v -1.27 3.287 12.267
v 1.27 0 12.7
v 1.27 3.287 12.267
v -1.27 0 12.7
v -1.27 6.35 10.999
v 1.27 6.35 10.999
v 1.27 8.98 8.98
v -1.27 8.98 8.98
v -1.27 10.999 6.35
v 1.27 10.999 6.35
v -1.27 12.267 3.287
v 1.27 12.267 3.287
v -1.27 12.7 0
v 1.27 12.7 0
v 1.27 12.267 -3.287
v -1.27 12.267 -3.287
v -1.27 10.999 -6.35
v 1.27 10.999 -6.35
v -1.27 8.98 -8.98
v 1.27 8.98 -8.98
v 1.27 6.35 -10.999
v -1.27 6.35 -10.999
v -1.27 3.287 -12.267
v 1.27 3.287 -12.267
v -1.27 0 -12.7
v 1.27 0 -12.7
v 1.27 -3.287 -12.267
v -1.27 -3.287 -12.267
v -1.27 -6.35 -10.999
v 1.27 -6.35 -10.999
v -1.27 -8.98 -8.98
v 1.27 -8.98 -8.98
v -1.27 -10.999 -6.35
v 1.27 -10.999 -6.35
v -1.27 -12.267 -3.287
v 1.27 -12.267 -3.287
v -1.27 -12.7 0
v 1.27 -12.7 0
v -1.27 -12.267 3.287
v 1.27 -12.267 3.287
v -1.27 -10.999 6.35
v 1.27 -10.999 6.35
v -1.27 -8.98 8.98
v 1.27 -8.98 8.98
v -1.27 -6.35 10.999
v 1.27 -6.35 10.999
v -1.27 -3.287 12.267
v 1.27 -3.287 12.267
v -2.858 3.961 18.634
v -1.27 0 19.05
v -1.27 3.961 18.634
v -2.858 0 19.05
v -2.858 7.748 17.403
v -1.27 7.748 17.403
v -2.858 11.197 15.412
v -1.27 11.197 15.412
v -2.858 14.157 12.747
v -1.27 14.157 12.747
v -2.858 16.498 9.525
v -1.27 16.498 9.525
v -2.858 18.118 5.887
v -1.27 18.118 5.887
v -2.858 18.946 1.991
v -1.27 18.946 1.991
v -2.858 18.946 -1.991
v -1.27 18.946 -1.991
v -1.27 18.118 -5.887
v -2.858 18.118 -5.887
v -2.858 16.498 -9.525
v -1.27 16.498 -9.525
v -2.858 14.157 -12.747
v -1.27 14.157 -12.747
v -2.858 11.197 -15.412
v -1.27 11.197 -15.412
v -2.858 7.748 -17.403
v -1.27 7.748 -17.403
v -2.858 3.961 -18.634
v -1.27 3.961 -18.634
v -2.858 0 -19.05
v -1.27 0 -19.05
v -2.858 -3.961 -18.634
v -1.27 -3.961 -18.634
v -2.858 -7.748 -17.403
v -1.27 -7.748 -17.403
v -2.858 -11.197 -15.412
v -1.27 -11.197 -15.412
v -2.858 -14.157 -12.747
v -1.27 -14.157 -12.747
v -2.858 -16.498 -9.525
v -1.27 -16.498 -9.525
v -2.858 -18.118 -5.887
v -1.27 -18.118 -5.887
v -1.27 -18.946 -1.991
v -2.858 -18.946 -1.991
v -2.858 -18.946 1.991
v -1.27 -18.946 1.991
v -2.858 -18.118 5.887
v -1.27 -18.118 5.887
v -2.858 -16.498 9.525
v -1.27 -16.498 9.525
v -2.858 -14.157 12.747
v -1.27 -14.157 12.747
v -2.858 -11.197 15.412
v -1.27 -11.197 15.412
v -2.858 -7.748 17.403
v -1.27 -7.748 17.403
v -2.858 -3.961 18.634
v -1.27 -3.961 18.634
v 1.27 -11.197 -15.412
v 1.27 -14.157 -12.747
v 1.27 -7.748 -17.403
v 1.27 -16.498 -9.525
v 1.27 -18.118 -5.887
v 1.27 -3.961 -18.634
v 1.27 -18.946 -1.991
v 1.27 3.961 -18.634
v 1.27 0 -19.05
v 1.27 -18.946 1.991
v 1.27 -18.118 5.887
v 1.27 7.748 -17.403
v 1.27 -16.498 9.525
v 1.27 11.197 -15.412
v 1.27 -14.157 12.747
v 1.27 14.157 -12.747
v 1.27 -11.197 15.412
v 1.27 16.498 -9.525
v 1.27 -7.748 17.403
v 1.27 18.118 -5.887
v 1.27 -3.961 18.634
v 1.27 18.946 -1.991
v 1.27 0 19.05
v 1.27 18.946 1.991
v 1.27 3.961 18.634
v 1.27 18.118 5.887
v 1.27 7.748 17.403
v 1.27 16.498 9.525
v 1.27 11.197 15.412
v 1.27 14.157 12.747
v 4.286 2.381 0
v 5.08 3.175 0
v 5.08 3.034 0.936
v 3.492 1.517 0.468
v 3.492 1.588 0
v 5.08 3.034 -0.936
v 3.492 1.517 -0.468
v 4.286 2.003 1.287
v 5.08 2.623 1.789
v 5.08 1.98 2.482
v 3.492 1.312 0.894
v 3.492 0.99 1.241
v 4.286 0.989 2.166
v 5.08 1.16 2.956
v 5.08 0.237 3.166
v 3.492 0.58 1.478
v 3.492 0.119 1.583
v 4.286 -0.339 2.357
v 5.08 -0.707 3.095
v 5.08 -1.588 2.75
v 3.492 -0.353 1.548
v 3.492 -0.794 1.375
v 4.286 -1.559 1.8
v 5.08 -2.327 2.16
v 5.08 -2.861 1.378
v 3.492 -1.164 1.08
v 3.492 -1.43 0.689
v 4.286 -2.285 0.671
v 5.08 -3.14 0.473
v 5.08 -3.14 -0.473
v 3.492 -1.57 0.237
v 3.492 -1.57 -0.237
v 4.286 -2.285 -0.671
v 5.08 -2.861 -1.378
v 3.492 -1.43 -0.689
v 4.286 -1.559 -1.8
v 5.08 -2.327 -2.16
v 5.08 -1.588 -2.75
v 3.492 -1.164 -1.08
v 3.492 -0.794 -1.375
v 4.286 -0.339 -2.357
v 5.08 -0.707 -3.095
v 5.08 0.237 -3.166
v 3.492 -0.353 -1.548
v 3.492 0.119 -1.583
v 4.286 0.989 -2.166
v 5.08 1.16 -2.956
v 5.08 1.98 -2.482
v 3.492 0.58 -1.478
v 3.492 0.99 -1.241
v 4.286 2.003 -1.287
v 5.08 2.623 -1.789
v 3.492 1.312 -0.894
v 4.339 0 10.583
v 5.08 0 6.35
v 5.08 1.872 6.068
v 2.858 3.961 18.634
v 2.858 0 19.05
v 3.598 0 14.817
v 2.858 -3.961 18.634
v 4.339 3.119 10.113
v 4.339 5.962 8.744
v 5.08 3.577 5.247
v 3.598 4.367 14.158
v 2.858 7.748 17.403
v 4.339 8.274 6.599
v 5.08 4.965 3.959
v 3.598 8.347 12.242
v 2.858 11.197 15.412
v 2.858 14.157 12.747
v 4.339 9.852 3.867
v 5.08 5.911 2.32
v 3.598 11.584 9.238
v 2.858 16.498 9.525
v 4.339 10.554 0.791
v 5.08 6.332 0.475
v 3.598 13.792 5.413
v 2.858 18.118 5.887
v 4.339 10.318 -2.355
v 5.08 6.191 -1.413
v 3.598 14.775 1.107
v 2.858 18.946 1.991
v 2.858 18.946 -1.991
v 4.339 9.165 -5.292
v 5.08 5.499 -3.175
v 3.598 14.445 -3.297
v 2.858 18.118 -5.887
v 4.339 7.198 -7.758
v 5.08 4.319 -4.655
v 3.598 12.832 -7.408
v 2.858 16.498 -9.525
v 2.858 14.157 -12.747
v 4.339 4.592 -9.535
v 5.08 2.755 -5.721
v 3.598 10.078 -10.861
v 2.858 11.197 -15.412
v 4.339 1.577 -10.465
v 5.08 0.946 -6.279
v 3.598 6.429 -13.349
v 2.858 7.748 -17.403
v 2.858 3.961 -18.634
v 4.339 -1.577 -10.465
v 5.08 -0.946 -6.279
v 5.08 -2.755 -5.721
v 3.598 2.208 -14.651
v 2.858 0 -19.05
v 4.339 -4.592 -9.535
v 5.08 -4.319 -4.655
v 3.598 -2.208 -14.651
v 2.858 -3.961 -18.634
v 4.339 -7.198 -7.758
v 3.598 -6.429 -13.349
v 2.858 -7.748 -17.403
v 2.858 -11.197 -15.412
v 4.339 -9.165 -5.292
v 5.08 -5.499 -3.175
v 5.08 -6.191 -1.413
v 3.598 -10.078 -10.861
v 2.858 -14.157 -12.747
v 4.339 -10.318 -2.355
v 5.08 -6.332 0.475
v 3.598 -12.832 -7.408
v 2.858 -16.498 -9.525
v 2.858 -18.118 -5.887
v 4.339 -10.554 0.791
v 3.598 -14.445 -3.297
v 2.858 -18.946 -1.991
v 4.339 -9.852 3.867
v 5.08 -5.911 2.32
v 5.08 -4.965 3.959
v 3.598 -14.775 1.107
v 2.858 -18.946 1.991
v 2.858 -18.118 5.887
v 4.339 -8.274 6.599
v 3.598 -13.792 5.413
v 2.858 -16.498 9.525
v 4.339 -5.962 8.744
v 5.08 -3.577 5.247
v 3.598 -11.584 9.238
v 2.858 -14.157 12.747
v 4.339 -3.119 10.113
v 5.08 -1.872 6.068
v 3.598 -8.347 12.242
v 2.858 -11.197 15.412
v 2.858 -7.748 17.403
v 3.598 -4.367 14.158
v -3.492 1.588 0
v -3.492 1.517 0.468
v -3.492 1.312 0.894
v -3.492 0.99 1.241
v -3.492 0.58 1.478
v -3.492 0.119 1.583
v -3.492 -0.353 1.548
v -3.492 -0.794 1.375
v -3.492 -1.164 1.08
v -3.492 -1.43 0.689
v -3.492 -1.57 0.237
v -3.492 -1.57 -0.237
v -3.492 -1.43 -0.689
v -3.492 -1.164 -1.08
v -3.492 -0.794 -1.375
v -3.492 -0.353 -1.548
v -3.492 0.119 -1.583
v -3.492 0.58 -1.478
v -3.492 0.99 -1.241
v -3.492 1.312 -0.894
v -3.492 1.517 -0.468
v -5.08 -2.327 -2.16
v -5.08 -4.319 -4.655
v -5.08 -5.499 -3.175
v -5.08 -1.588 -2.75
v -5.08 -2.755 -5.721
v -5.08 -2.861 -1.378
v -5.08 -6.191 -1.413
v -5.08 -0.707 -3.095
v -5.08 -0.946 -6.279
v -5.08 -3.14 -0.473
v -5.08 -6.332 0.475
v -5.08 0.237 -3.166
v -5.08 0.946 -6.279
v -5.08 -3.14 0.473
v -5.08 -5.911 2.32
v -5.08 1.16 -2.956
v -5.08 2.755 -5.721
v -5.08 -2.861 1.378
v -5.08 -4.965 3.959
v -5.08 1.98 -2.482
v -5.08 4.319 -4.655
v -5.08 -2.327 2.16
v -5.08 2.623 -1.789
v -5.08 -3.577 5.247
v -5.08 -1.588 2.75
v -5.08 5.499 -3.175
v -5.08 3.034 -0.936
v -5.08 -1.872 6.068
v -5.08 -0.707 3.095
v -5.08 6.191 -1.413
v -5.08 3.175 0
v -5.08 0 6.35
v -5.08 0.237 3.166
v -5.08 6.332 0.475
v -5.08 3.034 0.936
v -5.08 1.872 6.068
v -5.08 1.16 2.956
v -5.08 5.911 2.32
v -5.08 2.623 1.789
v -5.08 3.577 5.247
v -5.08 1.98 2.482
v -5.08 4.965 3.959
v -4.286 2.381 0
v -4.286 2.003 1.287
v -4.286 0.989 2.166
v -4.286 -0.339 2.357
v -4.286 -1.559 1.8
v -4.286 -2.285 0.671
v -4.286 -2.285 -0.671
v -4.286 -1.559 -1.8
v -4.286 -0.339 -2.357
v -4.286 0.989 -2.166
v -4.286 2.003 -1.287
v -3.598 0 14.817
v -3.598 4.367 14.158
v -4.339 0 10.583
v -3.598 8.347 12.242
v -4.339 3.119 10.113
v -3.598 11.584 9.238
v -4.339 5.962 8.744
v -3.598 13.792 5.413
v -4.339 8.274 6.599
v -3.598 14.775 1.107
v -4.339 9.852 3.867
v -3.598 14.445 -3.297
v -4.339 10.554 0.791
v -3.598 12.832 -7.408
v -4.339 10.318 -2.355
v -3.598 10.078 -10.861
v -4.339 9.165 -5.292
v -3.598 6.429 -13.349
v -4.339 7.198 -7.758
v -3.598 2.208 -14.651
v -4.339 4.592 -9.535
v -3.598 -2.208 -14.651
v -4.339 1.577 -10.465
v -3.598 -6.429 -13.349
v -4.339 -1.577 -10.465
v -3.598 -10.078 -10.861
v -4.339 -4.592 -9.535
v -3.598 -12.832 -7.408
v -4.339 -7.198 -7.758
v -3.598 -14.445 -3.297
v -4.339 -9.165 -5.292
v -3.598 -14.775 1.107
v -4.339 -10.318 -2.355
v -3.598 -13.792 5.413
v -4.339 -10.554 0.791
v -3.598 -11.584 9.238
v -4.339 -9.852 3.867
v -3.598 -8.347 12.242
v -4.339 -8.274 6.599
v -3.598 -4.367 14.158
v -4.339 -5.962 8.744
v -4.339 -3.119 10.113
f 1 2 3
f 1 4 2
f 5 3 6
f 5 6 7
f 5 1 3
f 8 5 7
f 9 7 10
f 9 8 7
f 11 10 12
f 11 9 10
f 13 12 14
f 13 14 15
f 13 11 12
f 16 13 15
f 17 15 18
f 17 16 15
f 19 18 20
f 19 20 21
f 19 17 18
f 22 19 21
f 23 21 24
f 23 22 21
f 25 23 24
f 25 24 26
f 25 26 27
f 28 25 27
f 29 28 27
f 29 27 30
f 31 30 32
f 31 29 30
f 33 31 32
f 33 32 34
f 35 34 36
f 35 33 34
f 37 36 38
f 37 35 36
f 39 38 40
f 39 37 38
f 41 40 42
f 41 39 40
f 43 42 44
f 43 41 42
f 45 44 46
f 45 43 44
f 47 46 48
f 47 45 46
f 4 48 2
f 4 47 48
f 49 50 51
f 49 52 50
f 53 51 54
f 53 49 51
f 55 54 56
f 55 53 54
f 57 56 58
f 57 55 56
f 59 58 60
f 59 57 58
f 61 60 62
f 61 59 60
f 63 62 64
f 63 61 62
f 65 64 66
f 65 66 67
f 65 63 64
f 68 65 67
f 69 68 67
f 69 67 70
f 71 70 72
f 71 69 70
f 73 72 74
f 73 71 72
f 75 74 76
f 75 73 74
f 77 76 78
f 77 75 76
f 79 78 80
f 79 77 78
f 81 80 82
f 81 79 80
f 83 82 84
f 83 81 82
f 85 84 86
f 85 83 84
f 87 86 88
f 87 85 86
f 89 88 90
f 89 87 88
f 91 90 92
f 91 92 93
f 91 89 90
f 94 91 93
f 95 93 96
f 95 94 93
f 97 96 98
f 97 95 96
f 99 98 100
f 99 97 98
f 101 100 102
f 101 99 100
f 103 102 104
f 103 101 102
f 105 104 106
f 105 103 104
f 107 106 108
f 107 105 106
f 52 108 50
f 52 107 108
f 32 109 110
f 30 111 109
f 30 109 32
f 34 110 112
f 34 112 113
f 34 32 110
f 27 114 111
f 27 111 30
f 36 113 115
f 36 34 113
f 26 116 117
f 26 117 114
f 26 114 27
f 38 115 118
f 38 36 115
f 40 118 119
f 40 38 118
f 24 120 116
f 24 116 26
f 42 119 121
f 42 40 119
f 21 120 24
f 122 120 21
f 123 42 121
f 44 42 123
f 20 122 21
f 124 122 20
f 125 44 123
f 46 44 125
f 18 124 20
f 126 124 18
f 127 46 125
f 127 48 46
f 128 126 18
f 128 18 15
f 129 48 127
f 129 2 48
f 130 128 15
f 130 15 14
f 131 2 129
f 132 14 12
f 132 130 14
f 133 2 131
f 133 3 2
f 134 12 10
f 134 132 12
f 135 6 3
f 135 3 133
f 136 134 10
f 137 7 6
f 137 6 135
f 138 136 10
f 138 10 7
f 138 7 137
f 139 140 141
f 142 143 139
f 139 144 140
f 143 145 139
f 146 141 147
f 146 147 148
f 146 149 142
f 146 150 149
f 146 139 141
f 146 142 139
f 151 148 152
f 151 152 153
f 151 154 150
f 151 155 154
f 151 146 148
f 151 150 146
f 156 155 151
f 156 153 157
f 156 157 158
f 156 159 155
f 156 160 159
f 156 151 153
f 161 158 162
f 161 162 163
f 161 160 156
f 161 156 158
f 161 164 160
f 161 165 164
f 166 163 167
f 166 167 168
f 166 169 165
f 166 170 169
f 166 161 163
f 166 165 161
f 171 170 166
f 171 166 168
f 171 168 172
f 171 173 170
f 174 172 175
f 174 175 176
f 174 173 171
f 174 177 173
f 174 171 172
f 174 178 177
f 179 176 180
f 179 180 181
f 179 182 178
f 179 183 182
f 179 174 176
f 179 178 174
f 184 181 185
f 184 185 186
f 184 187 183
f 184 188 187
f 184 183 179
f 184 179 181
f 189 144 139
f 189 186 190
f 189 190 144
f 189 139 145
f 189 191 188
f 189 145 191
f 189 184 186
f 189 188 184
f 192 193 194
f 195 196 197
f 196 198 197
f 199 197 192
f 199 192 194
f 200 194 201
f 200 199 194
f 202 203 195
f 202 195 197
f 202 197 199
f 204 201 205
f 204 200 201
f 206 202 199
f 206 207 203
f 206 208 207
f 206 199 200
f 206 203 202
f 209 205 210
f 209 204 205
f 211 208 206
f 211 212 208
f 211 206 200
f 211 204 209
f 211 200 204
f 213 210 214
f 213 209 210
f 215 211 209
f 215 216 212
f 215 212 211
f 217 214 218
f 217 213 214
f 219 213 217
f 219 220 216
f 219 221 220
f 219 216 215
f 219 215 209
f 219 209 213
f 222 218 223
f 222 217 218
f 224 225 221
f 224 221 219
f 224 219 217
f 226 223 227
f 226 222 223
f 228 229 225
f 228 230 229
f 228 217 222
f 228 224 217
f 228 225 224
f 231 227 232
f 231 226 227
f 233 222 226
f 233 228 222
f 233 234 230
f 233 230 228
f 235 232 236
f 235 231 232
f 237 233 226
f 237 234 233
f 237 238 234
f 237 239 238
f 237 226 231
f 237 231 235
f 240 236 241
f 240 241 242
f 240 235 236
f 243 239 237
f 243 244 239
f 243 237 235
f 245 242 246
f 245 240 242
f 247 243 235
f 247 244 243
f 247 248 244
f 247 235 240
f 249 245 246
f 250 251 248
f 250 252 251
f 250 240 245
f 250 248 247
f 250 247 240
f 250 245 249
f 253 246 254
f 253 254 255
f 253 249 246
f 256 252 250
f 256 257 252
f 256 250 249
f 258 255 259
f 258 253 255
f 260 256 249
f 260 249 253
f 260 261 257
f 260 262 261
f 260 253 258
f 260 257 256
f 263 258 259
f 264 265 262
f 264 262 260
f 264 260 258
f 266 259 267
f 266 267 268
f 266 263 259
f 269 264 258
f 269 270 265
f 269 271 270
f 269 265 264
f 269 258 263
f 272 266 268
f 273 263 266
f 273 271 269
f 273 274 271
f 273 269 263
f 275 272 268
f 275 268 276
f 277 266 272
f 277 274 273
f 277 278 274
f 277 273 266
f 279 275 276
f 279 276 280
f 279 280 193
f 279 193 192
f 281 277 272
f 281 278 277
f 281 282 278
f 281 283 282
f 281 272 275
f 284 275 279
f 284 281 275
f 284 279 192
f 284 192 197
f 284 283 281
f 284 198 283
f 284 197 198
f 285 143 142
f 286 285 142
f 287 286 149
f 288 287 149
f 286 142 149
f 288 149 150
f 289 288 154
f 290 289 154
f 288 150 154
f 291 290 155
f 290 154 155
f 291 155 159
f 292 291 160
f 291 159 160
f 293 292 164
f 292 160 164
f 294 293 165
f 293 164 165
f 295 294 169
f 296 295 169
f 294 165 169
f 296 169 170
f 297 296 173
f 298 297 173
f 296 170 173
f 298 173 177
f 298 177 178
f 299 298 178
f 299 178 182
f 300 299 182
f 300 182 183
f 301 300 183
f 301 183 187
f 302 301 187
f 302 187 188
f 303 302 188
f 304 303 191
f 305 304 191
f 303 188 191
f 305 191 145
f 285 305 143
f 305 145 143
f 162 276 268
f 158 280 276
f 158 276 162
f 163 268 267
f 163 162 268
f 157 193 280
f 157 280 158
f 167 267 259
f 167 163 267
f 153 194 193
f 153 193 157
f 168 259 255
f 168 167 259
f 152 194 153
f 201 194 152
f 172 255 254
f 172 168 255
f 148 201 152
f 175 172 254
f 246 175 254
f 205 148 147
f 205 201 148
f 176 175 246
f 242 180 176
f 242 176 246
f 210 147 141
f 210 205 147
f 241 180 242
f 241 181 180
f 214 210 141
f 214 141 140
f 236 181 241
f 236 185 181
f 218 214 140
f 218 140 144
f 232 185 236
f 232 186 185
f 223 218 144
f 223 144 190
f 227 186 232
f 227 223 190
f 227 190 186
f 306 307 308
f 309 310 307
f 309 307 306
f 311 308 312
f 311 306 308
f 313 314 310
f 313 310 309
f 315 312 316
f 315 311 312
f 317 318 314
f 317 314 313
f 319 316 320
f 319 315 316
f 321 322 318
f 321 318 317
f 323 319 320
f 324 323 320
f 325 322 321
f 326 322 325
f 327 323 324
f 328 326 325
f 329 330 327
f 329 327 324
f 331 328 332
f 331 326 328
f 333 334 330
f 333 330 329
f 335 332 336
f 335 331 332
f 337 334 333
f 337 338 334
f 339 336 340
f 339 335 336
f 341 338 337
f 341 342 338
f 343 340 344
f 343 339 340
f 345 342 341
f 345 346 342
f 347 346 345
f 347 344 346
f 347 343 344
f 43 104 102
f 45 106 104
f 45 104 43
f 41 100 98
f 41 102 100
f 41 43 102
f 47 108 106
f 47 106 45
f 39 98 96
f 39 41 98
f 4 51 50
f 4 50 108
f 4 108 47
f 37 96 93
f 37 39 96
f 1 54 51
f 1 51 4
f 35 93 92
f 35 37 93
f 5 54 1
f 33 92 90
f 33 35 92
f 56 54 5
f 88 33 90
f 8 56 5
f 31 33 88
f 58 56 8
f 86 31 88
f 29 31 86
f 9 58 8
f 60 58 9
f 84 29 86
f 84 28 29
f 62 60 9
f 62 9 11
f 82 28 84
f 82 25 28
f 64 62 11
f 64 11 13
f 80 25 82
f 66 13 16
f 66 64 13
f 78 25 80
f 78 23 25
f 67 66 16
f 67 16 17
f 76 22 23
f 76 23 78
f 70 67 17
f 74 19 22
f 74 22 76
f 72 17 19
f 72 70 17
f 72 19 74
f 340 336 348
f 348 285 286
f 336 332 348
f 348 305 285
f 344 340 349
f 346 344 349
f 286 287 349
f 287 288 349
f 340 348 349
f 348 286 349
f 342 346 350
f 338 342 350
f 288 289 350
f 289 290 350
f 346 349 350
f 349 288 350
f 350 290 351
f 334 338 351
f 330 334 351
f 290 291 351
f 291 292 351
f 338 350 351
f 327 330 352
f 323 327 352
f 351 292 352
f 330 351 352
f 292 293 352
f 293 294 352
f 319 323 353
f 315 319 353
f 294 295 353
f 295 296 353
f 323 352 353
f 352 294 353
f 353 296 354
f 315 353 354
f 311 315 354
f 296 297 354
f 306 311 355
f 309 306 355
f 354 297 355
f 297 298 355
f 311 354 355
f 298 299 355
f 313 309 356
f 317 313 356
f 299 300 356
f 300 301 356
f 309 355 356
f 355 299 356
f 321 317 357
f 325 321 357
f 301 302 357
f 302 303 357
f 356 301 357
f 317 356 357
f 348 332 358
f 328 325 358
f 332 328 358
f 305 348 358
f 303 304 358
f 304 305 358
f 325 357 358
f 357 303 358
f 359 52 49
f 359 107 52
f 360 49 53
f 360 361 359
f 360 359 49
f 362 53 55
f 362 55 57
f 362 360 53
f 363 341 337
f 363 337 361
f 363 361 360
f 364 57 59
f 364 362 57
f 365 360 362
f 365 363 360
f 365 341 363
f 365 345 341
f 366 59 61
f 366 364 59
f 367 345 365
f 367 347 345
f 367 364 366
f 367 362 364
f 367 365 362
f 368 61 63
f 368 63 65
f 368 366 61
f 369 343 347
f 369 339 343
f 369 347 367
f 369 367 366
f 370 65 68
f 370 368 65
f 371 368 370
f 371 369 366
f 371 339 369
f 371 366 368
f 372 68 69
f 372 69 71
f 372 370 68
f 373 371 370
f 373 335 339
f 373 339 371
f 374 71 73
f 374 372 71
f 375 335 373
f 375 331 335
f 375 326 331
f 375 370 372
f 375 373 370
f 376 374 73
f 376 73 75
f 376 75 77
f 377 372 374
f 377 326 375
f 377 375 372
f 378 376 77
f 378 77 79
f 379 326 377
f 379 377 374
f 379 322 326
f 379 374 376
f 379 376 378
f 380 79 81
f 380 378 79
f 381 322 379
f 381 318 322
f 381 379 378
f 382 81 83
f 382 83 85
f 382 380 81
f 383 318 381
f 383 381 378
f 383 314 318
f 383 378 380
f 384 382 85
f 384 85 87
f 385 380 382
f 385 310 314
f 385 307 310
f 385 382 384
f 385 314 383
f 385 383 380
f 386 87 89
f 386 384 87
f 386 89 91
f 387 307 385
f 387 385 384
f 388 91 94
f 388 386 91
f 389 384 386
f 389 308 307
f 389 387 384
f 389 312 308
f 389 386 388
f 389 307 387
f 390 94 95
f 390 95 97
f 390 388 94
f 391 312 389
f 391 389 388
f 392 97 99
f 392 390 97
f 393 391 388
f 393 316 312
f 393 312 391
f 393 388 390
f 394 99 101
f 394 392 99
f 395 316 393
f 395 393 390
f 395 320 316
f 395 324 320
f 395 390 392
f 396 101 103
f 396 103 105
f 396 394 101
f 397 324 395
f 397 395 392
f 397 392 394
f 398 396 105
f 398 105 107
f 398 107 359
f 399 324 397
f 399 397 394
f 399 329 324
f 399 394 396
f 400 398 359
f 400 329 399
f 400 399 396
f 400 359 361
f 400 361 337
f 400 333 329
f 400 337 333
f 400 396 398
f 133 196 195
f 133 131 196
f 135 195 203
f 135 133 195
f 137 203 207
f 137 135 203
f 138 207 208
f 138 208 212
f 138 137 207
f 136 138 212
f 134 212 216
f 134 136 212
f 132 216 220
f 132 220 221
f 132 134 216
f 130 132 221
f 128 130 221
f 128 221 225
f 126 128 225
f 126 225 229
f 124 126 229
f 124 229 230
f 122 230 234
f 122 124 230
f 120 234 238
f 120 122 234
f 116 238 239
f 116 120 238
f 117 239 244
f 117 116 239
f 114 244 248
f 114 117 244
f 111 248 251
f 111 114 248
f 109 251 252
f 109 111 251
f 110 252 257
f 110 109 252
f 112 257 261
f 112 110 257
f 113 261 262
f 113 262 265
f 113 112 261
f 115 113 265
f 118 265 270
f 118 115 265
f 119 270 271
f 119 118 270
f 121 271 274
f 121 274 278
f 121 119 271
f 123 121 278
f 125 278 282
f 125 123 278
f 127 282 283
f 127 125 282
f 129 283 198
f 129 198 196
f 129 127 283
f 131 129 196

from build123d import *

# Parameters (mm, degrees)
F2_R     = 1.5875
F3_DEPTH = 12.7
F4_SIZE  = 1.5875


with BuildPart() as f1:
    # F0 (on Front) → F1 (revolve)
    with BuildSketch(Plane.XZ):
        Polygon((1.27, 12.7), (0, 12.7), (-1.27, 12.7), (-1.27, 19.05), (-2.8575, 19.05), (-5.08, 6.35), (-5.08, 0), (5.08, 0), (5.08, 6.35), (2.8575, 19.05), (1.27, 19.05), align=None)
    revolve(axis=Axis((0, 0, 0), (-1, 0, 0)))

    # F2 (on Right) → F3 (cut, symmetric)
    with BuildSketch(Plane.YZ):
        Circle(F2_R)
    extrude(amount=F3_DEPTH, both=True, mode=Mode.SUBTRACT)

    # F4
    f4_edges = [f1.edges().sort_by_distance(p)[0] for p in [
        (5.08, -1.5875, 0),
        (-5.08, -1.5875, 0),
    ]]
    chamfer(f4_edges, length=F4_SIZE)


solid = f1.part
